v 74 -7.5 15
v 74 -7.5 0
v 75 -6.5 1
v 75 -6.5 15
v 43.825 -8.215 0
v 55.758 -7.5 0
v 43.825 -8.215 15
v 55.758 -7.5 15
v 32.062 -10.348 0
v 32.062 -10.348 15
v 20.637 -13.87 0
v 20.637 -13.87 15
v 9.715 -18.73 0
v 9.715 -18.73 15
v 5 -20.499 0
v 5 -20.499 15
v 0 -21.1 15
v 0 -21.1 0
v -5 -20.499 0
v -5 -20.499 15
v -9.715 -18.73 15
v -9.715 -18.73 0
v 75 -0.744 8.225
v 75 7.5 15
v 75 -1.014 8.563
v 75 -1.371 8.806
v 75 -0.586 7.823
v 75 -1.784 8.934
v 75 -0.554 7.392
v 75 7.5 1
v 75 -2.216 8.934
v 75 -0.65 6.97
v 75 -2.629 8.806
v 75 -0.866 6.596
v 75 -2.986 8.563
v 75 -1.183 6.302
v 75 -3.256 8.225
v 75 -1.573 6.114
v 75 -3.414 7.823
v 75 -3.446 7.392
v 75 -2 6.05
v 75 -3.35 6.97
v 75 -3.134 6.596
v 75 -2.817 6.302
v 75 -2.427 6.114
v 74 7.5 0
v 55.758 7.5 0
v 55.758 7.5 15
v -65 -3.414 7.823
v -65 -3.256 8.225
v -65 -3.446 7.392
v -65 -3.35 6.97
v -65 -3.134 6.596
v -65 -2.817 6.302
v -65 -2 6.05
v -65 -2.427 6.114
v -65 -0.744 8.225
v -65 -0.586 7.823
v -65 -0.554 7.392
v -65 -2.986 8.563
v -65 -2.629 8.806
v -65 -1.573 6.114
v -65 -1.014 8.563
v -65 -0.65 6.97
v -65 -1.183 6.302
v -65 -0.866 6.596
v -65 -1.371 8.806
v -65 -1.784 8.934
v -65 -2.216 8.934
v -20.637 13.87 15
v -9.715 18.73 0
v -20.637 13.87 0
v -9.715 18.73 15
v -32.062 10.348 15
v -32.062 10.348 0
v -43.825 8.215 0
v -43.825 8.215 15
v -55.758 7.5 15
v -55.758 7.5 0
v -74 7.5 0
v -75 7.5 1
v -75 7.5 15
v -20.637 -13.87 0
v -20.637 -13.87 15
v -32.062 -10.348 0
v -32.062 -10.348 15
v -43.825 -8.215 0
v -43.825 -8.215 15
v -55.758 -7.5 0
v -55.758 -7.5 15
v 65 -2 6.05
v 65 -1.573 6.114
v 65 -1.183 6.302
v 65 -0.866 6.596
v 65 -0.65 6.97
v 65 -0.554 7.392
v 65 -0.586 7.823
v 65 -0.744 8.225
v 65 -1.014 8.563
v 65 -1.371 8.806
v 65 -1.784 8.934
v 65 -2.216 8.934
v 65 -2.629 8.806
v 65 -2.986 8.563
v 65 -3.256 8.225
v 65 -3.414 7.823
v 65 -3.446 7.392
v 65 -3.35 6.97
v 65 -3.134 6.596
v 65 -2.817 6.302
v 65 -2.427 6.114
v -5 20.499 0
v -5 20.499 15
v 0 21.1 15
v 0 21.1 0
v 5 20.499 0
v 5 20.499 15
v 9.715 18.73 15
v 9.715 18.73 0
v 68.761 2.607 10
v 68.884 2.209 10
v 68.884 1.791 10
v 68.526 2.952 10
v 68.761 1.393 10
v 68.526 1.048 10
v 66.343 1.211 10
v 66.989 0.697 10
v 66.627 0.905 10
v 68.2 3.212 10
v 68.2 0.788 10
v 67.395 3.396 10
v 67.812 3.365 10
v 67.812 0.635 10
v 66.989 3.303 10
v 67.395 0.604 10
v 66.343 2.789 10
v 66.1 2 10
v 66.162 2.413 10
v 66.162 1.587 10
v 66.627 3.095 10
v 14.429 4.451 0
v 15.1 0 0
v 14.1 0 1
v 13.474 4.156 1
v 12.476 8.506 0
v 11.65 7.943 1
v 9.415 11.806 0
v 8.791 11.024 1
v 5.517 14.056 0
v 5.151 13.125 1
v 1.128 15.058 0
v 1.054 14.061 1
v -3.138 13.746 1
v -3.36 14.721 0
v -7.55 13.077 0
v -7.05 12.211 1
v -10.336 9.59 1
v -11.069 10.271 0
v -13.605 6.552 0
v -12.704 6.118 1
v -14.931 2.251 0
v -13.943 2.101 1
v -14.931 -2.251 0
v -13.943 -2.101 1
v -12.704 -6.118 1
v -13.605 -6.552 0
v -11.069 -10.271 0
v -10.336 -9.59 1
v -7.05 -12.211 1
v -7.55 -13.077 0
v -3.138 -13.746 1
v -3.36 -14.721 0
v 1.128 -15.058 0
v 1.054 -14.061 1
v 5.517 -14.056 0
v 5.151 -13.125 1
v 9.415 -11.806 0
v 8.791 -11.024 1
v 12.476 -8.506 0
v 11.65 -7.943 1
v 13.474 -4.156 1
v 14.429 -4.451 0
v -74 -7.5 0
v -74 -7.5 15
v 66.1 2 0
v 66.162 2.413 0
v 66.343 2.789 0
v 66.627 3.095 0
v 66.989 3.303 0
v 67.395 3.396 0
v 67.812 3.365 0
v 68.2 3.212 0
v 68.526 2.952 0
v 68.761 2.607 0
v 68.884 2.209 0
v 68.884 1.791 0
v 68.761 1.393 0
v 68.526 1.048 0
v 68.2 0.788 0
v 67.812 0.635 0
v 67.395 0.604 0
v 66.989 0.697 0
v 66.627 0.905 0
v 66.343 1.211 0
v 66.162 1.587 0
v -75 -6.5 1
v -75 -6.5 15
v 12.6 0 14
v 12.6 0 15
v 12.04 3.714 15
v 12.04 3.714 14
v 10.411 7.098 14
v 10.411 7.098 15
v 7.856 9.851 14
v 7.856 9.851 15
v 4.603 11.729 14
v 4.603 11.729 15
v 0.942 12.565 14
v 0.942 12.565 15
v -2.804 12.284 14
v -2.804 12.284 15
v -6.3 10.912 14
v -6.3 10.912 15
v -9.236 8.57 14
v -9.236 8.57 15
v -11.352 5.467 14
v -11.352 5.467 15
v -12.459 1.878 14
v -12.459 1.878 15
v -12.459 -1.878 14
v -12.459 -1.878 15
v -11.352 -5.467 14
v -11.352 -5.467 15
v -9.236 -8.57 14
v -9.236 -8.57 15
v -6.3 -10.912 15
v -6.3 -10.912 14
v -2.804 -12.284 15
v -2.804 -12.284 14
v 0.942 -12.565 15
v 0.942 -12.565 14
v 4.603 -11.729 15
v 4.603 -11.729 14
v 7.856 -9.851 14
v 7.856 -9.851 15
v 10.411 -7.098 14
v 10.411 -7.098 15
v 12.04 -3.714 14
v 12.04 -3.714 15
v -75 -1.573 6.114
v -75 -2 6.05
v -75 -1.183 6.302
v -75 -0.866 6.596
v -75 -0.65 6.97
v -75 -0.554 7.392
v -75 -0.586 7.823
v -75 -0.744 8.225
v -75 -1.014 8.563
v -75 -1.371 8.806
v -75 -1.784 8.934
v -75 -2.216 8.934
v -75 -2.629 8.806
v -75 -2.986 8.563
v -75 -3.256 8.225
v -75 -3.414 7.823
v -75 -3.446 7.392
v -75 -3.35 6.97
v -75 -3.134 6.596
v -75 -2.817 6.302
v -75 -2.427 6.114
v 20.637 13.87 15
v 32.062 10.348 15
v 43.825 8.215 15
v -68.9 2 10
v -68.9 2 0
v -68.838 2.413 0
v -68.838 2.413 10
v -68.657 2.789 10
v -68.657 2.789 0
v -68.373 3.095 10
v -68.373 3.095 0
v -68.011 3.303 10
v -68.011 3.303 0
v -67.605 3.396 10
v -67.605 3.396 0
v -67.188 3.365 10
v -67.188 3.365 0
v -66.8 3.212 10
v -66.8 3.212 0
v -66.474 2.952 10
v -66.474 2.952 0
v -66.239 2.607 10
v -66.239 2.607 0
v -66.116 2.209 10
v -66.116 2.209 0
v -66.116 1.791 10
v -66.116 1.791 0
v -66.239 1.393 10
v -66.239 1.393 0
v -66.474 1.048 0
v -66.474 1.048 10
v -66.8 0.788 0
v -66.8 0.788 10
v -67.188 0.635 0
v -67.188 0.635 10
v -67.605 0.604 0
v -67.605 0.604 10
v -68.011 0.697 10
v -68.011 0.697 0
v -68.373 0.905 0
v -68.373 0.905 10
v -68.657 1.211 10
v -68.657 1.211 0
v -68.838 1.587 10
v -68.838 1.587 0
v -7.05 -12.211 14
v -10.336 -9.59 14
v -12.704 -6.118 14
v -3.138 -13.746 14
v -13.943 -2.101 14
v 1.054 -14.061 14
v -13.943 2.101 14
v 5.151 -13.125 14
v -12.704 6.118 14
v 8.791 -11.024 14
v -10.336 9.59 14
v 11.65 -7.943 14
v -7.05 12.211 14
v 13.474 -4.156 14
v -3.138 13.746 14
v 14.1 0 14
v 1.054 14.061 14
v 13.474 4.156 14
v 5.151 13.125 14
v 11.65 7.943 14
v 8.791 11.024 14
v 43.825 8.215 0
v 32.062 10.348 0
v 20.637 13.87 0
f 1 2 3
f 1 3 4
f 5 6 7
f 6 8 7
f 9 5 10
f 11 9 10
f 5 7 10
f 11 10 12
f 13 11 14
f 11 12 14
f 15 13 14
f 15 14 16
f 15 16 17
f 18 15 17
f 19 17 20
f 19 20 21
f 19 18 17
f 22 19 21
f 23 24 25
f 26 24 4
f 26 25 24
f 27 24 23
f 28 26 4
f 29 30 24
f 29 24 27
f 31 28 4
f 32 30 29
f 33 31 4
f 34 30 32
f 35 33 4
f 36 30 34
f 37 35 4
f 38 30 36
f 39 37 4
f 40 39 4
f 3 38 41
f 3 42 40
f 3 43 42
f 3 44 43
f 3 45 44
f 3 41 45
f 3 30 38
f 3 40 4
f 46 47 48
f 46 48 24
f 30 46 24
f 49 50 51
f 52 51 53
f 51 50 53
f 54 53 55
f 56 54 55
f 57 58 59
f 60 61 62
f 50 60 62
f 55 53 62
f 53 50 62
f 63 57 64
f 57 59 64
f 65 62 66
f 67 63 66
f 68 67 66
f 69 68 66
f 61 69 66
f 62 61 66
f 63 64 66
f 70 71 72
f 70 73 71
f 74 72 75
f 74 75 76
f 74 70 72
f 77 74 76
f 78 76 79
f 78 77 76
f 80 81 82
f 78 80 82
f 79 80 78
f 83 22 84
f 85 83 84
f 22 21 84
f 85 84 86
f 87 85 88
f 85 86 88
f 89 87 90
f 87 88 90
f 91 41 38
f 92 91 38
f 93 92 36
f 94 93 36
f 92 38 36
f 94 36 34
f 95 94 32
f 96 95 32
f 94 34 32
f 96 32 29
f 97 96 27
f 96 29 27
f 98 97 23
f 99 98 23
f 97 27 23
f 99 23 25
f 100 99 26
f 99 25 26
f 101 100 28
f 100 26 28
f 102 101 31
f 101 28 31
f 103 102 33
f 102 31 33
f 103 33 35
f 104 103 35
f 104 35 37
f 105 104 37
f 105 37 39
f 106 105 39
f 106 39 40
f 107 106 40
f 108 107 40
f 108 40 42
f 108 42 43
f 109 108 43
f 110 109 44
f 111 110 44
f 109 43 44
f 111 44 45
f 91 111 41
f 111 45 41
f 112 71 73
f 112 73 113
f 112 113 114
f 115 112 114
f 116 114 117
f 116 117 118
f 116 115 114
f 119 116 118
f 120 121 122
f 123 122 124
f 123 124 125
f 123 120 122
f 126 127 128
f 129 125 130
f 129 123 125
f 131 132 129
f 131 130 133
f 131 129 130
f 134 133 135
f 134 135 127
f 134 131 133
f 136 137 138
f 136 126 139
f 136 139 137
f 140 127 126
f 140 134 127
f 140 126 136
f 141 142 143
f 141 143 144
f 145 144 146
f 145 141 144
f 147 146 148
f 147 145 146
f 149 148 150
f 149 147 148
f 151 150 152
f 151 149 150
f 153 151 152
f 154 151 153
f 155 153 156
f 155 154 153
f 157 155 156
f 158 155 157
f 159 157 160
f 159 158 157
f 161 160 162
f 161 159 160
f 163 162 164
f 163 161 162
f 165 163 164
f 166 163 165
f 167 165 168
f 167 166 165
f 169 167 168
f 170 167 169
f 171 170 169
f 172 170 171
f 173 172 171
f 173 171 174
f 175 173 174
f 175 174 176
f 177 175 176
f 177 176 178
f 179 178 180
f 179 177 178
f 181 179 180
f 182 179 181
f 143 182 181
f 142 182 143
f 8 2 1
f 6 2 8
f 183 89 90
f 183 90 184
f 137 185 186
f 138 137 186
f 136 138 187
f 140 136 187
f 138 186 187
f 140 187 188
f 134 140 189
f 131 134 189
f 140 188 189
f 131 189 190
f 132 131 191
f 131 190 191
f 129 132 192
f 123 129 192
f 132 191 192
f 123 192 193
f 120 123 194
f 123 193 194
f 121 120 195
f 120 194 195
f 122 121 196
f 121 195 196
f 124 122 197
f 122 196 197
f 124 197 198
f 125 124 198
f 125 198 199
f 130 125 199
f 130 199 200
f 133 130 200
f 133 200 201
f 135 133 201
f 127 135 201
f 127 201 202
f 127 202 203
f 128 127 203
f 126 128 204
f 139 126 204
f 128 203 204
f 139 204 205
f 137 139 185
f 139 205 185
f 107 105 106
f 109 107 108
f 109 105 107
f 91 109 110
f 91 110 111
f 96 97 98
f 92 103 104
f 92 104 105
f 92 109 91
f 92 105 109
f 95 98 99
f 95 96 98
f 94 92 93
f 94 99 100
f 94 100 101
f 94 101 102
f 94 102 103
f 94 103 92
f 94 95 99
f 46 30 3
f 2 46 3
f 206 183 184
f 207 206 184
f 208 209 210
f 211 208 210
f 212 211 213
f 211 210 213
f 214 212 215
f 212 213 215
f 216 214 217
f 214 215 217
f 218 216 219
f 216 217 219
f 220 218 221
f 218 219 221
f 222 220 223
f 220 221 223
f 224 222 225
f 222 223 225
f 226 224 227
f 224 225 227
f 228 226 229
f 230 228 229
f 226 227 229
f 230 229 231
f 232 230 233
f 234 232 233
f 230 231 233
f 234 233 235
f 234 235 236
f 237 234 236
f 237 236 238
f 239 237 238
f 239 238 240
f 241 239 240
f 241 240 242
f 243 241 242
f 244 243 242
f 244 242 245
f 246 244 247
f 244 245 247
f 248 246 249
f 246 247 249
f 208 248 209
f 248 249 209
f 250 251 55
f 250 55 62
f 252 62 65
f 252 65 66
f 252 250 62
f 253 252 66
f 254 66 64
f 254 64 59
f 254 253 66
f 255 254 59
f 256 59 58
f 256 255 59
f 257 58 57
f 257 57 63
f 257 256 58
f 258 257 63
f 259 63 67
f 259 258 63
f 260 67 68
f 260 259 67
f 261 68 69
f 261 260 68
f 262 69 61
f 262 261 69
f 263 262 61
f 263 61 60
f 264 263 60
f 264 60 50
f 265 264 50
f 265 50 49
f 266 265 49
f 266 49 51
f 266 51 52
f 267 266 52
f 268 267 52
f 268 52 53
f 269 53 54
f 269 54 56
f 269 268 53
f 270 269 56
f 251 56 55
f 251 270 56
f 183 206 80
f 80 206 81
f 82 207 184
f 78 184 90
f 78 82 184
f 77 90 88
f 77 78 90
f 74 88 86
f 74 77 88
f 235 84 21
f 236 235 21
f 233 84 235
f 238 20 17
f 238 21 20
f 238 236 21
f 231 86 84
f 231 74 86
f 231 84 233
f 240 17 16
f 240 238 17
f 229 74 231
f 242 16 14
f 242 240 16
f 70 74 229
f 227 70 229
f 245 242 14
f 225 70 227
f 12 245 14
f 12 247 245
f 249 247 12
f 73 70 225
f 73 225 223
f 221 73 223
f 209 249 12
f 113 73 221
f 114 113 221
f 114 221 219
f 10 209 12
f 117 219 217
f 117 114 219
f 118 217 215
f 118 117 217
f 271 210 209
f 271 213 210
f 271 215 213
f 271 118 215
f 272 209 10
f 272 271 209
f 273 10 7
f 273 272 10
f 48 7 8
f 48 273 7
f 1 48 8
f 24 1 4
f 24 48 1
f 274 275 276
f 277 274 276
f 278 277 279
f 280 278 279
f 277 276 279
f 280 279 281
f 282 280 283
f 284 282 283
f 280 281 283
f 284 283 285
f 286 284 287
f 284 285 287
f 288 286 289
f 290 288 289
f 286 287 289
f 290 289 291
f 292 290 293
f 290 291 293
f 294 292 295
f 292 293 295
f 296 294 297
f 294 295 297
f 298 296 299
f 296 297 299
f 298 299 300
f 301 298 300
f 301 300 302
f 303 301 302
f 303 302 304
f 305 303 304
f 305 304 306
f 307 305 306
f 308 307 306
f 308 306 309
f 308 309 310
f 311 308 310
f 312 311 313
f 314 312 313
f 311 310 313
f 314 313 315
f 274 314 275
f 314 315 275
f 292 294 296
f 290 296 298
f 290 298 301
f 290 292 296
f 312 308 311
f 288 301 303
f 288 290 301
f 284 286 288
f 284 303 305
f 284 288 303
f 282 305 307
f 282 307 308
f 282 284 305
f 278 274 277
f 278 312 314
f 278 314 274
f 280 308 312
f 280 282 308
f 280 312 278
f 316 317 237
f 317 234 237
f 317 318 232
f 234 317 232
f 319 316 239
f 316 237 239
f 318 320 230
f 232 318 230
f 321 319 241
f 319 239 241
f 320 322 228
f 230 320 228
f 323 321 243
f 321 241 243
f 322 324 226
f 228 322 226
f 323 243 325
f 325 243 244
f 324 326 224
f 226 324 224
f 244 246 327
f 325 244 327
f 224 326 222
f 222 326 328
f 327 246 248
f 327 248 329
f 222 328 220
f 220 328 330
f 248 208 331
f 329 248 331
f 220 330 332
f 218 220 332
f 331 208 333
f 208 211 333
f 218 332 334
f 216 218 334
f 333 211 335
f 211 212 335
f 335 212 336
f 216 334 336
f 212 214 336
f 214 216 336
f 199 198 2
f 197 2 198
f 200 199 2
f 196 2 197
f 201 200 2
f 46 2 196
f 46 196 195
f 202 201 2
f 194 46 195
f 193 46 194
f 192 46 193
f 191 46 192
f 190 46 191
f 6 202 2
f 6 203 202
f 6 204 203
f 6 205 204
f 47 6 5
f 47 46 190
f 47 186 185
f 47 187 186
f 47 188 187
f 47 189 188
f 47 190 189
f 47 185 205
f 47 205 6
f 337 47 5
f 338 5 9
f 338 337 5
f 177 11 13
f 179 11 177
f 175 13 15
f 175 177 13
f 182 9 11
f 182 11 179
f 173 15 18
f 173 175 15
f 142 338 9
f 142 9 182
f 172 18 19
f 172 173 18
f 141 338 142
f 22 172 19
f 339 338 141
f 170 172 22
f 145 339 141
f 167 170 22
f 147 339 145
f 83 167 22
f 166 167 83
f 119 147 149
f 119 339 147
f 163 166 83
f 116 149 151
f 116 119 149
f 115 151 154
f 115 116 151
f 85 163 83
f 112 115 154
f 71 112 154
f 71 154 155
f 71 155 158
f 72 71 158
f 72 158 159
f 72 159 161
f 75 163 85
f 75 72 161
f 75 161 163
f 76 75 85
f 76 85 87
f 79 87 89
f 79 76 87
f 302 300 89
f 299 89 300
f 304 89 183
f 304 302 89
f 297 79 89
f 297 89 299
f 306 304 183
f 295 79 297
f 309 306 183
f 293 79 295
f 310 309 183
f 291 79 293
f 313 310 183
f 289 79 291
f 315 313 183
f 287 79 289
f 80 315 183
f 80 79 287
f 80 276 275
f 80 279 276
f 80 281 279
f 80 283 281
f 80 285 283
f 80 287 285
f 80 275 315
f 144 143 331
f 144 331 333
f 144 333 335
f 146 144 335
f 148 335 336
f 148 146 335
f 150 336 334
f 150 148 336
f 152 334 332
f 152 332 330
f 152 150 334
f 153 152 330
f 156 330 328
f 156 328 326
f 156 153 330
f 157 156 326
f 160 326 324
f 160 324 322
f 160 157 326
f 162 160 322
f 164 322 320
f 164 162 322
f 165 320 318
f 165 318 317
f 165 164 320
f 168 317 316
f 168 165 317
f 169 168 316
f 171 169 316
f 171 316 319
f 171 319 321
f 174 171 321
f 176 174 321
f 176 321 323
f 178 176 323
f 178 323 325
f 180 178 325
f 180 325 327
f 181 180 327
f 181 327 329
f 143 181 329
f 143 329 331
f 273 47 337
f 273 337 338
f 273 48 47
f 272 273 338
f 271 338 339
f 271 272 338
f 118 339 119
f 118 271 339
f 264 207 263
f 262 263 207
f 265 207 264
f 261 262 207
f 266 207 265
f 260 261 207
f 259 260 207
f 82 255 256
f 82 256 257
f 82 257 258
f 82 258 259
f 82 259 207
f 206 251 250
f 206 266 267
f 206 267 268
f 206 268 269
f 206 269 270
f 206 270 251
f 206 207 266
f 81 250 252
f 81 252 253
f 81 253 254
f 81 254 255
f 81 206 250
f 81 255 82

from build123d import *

# Parameters (mm, degrees)
SKIZZE1_R                       = 14.1
AUFSATZ_LINEAR_AUSTRAGEN1_DEPTH = 15
VERRUNDUNG1_R                   = 100
SKIZZE2_R                       = 1.4
SCHNITT_LINEAR_AUSTRAGEN1_DEPTH = 10
SKIZZE3_R                       = 1.45
SCHNITT_LINEAR_AUSTRAGEN2_DEPTH = 10
SKIZZE6_R                       = 14.1
SKIZZE6_R_2                     = 12.6
AUFSATZ_LINEAR_AUSTRAGEN3_DEPTH = 1
FASE1_SIZE                      = 1
FASE2_SIZE                      = 1


with BuildPart() as part:
    # Skizze1 → Aufsatz-Linear austragen1 (new body)
    with BuildSketch(Plane.XY):
        with BuildLine():
            Line((19.722068857, 7.5), (75, 7.5))
            Line((75, 7.5), (75, -7.5))
            Line((75, -7.5), (19.722068857, -7.5))
            ThreePointArc((19.722068857, -7.5), (0, -21.1), (-19.722068857, -7.5))
            Line((-19.722068857, -7.5), (-75, -7.5))
            Line((-75, -7.5), (-75, 7.5))
            Line((-75, 7.5), (-19.722068857, 7.5))
            ThreePointArc((-19.722068857, 7.5), (0, 21.1), (19.722068857, 7.5))
        make_face()
        Circle(SKIZZE1_R, mode=Mode.SUBTRACT)
    extrude(amount=AUFSATZ_LINEAR_AUSTRAGEN1_DEPTH)

    # Verrundung1
    verrundung1_edges = [part.edges().sort_by_distance(p)[0] for p in [
        (19.722068857, -7.5, 7.5),
        (-19.722068857, -7.5, 7.5),
        (-19.722068857, 7.5, 7.5),
        (19.722068857, 7.5, 7.5),
    ]]
    fillet(verrundung1_edges, radius=VERRUNDUNG1_R)

    # Skizze2 → Schnitt-Linear austragen1 (cut)
    with BuildSketch(Plane(origin=(0, 0, 0), x_dir=(-1, 0, 0), z_dir=(0, 0, -1))):
        with Locations((-67.5, 2)):
            Circle(SKIZZE2_R)
        with Locations((67.5, 2)):
            Circle(SKIZZE2_R)
    extrude(amount=-SCHNITT_LINEAR_AUSTRAGEN1_DEPTH, mode=Mode.SUBTRACT)

    # Skizze3 → Schnitt-Linear austragen2 (cut)
    with BuildSketch(Plane(origin=(75, 0, 0), x_dir=(0, 0, -1), z_dir=(1, 0, 0))):
        with Locations((-7.5, -2)):
            Circle(SKIZZE3_R)
    schnitt_linear_austragen2 = extrude(amount=-SCHNITT_LINEAR_AUSTRAGEN2_DEPTH, mode=Mode.SUBTRACT)

    # Spiegeln1: Schnitt-Linear austragen2 across plane
    add(schnitt_linear_austragen2.mirror(Plane(origin=(0, 0, 0), x_dir=(0, 0, 1), z_dir=(1, 0, 0))), mode=Mode.SUBTRACT)

    # Skizze6 → Aufsatz-Linear austragen3 (add)
    with BuildSketch(Plane.XY.offset(15)):
        Circle(SKIZZE6_R)
        Circle(SKIZZE6_R_2, mode=Mode.SUBTRACT)
    extrude(amount=-AUFSATZ_LINEAR_AUSTRAGEN3_DEPTH)

    # Fase1
    fase1_edges = [part.edges().sort_by_distance(p)[0] for p in [
        (-14.1, 0, 0),
    ]]
    chamfer(fase1_edges, length=FASE1_SIZE)

    # Fase2
    fase2_edges = [part.edges().sort_by_distance(p)[0] for p in [
        (75, 0, 0),
        (75, -7.5, 7.5),
        (-75, -7.5, 7.5),
        (-75, 0, 0),
    ]]
    chamfer(fase2_edges, length=FASE2_SIZE)


solid = part.part
